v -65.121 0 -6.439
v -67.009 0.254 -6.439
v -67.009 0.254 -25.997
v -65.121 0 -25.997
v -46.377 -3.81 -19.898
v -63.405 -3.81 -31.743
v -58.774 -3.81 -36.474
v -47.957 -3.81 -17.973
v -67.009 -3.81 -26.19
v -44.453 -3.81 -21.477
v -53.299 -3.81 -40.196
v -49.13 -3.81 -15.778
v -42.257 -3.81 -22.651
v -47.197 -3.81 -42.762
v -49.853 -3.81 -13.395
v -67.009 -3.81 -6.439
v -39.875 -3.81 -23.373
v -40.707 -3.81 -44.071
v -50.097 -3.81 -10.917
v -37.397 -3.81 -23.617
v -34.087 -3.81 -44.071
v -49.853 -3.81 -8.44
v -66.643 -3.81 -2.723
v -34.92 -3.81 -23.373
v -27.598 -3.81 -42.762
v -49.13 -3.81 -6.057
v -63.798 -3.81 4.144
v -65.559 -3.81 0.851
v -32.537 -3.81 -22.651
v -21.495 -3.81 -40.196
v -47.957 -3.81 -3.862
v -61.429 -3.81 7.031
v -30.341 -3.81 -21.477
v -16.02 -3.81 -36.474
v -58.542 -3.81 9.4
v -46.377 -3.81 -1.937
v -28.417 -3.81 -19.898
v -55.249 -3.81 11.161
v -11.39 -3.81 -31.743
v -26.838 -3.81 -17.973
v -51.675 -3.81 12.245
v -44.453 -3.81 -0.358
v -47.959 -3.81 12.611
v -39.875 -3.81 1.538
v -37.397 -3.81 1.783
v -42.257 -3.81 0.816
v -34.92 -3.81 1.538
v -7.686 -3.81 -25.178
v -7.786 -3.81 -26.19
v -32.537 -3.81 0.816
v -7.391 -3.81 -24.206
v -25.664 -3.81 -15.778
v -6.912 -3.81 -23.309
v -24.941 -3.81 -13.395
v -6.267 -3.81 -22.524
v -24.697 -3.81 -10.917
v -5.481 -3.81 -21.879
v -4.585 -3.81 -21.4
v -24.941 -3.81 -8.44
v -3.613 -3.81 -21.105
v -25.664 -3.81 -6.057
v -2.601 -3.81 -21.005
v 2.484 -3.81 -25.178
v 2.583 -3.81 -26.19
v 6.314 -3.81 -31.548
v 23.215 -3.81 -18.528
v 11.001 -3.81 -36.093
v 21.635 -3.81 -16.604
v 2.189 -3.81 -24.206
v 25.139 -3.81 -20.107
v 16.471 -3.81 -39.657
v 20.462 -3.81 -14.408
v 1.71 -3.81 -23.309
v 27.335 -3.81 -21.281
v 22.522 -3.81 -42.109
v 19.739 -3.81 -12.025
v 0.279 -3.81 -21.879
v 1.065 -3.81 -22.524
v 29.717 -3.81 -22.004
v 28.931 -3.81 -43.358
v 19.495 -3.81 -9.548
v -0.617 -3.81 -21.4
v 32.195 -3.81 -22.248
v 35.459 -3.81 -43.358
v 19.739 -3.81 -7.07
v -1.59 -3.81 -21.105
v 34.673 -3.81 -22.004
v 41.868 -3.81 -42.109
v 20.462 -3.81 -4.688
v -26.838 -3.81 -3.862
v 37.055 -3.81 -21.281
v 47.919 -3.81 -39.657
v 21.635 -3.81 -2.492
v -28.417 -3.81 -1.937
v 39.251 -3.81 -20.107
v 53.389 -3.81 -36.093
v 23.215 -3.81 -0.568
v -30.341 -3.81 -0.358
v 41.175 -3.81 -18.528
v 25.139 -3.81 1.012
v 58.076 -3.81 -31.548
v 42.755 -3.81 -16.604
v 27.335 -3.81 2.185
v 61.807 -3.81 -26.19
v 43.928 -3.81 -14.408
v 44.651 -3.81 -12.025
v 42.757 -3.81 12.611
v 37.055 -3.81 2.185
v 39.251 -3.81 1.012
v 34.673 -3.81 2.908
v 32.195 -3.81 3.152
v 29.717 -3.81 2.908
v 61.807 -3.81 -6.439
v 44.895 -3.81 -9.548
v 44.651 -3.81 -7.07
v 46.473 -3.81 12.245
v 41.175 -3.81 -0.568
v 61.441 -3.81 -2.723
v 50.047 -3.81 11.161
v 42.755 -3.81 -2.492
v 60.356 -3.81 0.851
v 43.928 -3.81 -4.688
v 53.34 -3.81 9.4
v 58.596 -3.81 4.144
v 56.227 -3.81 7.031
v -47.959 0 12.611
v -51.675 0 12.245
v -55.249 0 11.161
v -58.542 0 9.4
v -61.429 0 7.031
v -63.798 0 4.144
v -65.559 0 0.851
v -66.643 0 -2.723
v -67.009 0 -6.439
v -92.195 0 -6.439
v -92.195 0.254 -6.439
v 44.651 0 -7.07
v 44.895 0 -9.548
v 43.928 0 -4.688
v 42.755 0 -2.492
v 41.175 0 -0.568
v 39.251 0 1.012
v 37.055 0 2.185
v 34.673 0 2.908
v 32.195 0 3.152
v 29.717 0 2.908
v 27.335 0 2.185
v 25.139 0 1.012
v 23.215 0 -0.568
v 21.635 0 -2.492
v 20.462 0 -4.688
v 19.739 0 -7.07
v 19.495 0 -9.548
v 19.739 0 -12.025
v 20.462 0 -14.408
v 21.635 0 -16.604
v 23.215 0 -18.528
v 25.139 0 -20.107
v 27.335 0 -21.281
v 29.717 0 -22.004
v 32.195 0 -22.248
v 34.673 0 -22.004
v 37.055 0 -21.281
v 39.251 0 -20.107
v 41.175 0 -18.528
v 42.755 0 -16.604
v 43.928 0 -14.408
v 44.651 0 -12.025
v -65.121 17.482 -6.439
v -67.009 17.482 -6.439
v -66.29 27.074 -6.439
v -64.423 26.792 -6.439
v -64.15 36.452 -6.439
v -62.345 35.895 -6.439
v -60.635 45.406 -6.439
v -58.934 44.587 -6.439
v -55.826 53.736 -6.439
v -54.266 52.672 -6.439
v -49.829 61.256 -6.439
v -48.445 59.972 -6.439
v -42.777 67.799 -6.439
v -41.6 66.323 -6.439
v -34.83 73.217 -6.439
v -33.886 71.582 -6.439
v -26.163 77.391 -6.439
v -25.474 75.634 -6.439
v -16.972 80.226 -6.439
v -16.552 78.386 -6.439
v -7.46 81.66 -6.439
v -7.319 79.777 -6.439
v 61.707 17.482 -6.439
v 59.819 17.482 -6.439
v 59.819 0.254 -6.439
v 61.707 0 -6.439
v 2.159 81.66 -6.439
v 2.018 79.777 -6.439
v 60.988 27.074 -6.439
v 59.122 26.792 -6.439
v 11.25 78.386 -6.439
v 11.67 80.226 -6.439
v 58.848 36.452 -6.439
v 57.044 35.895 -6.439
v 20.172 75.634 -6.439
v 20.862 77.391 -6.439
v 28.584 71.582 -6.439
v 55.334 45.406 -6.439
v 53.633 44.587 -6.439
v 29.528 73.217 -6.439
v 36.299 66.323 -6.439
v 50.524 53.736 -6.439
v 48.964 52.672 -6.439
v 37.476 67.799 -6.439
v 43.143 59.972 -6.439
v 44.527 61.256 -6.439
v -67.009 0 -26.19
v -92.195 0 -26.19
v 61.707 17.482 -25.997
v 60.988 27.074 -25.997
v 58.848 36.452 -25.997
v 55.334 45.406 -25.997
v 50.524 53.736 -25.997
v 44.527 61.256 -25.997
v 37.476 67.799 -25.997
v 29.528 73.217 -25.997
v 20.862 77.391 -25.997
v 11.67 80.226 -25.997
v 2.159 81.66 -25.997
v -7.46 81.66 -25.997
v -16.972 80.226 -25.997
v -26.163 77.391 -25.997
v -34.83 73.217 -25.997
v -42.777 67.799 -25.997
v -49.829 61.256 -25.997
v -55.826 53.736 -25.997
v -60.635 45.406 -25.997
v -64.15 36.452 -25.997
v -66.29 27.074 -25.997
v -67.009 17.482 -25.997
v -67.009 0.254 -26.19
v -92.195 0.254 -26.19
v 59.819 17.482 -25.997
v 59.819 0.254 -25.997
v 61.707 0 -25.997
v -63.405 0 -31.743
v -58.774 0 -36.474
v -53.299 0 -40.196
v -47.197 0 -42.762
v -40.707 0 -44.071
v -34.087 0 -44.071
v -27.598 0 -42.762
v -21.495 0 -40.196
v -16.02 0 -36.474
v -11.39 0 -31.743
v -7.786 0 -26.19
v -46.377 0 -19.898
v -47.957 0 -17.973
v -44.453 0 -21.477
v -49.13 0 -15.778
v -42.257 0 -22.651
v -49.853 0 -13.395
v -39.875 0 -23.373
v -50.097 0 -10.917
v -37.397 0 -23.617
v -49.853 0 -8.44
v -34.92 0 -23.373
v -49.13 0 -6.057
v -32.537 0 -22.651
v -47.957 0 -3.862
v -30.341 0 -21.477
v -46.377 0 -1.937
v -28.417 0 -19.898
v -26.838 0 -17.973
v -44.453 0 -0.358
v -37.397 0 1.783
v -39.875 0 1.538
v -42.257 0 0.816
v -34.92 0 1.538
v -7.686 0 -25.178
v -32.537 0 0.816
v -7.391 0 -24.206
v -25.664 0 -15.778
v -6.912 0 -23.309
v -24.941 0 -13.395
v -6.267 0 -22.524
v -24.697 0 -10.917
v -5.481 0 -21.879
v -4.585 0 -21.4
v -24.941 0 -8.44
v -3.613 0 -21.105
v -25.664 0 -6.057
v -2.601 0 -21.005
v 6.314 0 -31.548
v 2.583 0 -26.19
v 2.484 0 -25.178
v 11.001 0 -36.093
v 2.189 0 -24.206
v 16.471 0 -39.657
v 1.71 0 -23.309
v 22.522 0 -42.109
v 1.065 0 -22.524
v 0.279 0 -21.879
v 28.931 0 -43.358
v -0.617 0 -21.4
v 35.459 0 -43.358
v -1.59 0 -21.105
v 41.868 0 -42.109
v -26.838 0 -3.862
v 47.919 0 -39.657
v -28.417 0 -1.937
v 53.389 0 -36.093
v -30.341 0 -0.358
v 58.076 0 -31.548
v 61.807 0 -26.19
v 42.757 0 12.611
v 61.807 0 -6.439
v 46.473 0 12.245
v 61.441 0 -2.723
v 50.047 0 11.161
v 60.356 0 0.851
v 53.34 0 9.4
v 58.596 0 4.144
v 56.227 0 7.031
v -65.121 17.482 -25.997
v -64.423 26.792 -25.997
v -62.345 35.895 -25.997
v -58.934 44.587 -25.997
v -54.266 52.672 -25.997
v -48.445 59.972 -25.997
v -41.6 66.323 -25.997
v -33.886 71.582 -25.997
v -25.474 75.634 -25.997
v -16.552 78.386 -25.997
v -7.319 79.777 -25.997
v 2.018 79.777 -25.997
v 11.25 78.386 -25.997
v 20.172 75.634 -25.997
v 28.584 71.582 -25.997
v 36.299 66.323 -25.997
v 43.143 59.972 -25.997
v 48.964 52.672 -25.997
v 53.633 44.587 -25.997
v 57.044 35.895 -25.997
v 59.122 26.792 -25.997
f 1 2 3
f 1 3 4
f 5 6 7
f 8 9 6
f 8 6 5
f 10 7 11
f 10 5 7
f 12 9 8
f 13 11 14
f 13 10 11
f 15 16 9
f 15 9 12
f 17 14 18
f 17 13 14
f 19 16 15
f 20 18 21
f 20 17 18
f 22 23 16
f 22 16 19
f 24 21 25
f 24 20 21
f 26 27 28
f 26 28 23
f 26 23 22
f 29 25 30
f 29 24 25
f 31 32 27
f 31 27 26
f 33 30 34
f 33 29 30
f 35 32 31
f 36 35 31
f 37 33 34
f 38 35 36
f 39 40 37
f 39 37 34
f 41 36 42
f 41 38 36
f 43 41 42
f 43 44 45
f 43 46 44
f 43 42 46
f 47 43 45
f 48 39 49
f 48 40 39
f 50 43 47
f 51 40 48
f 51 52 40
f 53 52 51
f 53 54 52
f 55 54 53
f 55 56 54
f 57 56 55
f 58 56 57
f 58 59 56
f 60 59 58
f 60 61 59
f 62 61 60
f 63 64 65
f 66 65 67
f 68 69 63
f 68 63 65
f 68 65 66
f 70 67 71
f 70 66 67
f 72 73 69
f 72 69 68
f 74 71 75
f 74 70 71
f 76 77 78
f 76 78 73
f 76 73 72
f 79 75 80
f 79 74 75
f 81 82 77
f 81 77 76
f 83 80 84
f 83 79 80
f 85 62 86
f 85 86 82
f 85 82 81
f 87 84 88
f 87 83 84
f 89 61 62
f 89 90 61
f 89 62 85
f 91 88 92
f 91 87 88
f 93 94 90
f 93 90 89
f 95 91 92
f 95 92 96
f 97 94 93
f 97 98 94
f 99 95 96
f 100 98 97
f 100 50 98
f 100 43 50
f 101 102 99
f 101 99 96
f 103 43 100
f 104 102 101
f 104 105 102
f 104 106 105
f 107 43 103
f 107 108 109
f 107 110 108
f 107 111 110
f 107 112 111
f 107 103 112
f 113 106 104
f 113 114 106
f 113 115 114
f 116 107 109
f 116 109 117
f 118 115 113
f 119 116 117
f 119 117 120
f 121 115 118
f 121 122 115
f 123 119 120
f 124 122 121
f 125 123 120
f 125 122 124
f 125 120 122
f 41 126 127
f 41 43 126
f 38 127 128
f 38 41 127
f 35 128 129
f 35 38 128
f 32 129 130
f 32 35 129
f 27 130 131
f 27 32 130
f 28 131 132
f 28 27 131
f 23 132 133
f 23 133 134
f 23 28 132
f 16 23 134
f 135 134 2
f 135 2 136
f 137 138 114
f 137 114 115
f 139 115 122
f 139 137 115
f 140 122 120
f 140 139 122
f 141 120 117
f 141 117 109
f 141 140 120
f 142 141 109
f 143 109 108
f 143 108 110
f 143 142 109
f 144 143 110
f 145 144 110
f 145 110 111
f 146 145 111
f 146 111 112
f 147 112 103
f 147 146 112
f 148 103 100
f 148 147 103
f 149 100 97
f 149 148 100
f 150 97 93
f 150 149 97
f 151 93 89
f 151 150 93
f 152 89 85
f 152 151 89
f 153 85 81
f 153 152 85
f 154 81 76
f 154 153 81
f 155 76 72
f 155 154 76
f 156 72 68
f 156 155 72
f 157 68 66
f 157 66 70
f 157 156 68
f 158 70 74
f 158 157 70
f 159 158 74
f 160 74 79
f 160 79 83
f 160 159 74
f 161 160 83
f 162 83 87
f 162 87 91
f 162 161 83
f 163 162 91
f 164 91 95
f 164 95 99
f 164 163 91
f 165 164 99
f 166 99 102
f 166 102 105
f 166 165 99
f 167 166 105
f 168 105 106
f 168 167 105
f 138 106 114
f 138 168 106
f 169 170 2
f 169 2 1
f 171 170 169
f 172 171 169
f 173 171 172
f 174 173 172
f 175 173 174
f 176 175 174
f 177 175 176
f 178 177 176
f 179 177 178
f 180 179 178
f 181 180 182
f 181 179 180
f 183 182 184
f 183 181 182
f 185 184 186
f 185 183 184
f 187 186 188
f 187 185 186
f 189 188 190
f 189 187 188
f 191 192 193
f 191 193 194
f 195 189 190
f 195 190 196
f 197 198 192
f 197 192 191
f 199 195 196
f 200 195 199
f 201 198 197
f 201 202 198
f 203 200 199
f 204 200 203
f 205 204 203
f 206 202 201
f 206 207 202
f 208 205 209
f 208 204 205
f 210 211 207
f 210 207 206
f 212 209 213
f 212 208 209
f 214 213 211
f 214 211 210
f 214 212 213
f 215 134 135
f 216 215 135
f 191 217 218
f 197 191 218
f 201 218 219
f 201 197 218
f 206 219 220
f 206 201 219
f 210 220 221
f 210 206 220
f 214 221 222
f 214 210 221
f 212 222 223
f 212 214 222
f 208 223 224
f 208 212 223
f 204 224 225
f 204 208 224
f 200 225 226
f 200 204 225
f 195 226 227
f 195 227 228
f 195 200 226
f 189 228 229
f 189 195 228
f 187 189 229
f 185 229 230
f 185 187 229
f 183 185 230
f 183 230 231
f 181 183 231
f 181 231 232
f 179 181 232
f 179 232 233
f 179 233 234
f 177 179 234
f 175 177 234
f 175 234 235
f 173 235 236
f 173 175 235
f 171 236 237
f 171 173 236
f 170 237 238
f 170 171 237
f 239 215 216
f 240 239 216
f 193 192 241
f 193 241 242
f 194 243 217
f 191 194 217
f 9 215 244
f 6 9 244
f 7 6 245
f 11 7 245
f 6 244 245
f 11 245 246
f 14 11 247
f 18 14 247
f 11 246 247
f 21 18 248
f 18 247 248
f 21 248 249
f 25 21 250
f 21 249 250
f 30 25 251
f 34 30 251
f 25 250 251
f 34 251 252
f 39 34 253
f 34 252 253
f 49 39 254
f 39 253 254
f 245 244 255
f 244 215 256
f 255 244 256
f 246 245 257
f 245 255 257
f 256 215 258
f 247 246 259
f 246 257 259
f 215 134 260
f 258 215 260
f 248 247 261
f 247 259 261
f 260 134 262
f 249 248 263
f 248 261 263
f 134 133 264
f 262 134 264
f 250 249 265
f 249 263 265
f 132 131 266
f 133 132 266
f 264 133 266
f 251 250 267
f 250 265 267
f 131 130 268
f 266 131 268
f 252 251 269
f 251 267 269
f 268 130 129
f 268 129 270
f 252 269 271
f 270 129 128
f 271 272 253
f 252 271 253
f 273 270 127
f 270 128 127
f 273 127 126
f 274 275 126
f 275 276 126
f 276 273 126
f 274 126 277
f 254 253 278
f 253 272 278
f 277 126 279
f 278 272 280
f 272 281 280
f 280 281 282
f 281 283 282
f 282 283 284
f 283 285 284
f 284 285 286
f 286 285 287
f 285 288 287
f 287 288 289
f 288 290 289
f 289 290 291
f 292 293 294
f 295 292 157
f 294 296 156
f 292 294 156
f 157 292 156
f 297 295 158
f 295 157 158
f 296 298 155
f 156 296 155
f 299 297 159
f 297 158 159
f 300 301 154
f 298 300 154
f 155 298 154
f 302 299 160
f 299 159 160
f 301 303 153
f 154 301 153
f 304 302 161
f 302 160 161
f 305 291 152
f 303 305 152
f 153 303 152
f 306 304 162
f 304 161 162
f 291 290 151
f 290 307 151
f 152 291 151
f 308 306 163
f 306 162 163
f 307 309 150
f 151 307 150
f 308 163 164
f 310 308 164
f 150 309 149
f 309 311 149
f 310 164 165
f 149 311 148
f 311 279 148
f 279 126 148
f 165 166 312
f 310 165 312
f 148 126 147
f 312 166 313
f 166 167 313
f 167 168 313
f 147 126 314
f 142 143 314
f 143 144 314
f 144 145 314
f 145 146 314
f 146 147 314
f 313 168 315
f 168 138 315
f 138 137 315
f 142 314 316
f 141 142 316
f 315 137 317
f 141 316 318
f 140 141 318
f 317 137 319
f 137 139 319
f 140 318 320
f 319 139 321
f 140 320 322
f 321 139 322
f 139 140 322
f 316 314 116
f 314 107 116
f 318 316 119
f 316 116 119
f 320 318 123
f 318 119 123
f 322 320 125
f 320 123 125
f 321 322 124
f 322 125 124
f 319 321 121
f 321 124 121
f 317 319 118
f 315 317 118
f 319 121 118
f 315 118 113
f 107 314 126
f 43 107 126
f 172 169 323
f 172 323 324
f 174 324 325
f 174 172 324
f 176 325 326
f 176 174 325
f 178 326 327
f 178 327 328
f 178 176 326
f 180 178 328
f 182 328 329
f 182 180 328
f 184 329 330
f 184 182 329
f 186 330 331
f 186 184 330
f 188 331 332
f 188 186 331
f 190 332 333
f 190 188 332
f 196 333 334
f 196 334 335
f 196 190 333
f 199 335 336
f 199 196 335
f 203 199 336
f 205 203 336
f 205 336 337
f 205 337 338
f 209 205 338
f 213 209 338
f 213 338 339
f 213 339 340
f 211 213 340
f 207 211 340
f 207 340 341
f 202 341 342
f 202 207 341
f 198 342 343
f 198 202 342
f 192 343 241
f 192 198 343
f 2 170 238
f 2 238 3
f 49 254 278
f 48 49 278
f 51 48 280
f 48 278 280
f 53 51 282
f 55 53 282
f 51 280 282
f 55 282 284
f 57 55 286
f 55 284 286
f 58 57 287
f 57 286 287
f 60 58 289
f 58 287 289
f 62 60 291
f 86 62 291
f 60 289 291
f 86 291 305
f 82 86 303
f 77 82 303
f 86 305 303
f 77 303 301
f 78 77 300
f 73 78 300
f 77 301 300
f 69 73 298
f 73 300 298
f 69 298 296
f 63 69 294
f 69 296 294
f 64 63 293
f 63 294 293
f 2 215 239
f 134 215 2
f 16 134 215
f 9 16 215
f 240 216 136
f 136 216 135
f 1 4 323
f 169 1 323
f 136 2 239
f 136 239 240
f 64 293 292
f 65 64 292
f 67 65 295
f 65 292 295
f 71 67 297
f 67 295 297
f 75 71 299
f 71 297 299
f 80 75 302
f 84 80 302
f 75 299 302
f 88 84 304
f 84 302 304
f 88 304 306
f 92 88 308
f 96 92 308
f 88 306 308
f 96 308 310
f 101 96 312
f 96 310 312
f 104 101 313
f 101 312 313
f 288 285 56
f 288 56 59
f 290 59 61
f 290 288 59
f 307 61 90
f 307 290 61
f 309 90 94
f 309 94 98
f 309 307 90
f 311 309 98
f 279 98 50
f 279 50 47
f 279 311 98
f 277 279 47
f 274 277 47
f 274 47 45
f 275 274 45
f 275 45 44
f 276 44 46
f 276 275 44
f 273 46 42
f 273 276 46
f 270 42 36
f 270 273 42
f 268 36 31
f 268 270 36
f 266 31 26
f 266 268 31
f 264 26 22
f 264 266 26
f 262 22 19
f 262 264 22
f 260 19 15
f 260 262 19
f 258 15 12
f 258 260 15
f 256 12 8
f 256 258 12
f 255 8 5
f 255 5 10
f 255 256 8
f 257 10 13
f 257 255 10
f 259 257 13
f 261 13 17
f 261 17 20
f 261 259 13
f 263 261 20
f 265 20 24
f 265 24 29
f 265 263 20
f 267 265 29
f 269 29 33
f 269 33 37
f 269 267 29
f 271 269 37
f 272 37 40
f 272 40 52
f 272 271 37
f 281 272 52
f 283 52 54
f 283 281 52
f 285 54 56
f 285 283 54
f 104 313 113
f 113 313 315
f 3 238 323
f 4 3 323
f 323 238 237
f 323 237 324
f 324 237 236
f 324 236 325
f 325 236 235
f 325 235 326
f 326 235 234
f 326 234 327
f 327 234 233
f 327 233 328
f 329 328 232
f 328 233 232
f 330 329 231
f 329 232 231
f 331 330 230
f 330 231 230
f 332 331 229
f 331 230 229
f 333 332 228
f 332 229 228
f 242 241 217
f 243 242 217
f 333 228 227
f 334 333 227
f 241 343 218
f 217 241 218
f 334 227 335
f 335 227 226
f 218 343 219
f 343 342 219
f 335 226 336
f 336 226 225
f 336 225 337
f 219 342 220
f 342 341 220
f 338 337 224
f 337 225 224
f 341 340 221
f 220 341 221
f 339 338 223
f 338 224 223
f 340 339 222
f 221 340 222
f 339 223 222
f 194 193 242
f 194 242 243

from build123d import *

# Parameters (mm, degrees)
F0_R     = 12.7
F1_DEPTH = 3.81
F2_R     = 19.05
F3_W     = 25.186133
F3_H     = 19.750299
F4_DEPTH = 0.254
F6_DEPTH = 19.558


with BuildPart() as f1:
    # F0 (on Front) → F1 (new body)
    with BuildSketch(Plane.XZ):
        with BuildLine():
            Line((61.806571, 12.610613), (-67.008797, 12.610613))
            Line((-67.008797, 12.610613), (-67.008797, -26.189686))
            ThreePointArc((-67.008797, -26.189686), (-37.397166, -44.235478), (-7.785536, -26.189686))
            ThreePointArc((-7.785536, -26.189686), (-2.601111, -21.005262), (2.583313, -26.189686))
            ThreePointArc((2.583313, -26.189686), (32.194942, -43.515437), (61.806571, -26.189686))
            Line((61.806571, -26.189686), (61.806571, 12.610613))
        make_face()
        with Locations((-37.397166, -10.917481)):
            Circle(F0_R, mode=Mode.SUBTRACT)
        with Locations((32.194942, -9.547783)):
            Circle(F0_R, mode=Mode.SUBTRACT)
    extrude(amount=F1_DEPTH)

    # F2
    f2_edges = [f1.edges().sort_by_distance(p)[0] for p in [
        (-67.008797, -1.905, 12.610613),
        (61.806571, -1.905, 12.610613),
    ]]
    fillet(f2_edges, radius=F2_R)


with BuildPart() as f4:
    # F3 (on face) → F4 (new body)
    with BuildSketch(Plane(origin=(0, 0, 0), x_dir=(-1, 0, 0), z_dir=(0, 1, 0))):
        with Locations((79.601864, -16.314536)):
            Rectangle(F3_W, F3_H)
    extrude(amount=F4_DEPTH)


with BuildPart() as f6:
    # F5 (on face) → F6 (new body)
    with BuildSketch(Plane.XY.offset(-6.439387)):
        with BuildLine():
            Line((-67.008797, 17.481778), (-67.008797, 0.254))
            Line((-67.008797, 0.254), (-65.120806, 0))
            Line((-65.120806, 0), (-65.120806, 17.481778))
            ThreePointArc((-65.120806, 17.481778), (-2.650738, 79.951846), (59.819331, 17.481778))
            Line((59.819331, 17.481778), (59.819331, 0.254))
            Line((59.819331, 0.254), (61.707322, 0))
            Line((61.707322, 0), (61.707322, 17.481778))
            ThreePointArc((61.707322, 17.481778), (-2.650738, 81.839837), (-67.008797, 17.481778))
        make_face()
    extrude(amount=-F6_DEPTH)


solid = Compound([f1.part, f4.part, f6.part])
